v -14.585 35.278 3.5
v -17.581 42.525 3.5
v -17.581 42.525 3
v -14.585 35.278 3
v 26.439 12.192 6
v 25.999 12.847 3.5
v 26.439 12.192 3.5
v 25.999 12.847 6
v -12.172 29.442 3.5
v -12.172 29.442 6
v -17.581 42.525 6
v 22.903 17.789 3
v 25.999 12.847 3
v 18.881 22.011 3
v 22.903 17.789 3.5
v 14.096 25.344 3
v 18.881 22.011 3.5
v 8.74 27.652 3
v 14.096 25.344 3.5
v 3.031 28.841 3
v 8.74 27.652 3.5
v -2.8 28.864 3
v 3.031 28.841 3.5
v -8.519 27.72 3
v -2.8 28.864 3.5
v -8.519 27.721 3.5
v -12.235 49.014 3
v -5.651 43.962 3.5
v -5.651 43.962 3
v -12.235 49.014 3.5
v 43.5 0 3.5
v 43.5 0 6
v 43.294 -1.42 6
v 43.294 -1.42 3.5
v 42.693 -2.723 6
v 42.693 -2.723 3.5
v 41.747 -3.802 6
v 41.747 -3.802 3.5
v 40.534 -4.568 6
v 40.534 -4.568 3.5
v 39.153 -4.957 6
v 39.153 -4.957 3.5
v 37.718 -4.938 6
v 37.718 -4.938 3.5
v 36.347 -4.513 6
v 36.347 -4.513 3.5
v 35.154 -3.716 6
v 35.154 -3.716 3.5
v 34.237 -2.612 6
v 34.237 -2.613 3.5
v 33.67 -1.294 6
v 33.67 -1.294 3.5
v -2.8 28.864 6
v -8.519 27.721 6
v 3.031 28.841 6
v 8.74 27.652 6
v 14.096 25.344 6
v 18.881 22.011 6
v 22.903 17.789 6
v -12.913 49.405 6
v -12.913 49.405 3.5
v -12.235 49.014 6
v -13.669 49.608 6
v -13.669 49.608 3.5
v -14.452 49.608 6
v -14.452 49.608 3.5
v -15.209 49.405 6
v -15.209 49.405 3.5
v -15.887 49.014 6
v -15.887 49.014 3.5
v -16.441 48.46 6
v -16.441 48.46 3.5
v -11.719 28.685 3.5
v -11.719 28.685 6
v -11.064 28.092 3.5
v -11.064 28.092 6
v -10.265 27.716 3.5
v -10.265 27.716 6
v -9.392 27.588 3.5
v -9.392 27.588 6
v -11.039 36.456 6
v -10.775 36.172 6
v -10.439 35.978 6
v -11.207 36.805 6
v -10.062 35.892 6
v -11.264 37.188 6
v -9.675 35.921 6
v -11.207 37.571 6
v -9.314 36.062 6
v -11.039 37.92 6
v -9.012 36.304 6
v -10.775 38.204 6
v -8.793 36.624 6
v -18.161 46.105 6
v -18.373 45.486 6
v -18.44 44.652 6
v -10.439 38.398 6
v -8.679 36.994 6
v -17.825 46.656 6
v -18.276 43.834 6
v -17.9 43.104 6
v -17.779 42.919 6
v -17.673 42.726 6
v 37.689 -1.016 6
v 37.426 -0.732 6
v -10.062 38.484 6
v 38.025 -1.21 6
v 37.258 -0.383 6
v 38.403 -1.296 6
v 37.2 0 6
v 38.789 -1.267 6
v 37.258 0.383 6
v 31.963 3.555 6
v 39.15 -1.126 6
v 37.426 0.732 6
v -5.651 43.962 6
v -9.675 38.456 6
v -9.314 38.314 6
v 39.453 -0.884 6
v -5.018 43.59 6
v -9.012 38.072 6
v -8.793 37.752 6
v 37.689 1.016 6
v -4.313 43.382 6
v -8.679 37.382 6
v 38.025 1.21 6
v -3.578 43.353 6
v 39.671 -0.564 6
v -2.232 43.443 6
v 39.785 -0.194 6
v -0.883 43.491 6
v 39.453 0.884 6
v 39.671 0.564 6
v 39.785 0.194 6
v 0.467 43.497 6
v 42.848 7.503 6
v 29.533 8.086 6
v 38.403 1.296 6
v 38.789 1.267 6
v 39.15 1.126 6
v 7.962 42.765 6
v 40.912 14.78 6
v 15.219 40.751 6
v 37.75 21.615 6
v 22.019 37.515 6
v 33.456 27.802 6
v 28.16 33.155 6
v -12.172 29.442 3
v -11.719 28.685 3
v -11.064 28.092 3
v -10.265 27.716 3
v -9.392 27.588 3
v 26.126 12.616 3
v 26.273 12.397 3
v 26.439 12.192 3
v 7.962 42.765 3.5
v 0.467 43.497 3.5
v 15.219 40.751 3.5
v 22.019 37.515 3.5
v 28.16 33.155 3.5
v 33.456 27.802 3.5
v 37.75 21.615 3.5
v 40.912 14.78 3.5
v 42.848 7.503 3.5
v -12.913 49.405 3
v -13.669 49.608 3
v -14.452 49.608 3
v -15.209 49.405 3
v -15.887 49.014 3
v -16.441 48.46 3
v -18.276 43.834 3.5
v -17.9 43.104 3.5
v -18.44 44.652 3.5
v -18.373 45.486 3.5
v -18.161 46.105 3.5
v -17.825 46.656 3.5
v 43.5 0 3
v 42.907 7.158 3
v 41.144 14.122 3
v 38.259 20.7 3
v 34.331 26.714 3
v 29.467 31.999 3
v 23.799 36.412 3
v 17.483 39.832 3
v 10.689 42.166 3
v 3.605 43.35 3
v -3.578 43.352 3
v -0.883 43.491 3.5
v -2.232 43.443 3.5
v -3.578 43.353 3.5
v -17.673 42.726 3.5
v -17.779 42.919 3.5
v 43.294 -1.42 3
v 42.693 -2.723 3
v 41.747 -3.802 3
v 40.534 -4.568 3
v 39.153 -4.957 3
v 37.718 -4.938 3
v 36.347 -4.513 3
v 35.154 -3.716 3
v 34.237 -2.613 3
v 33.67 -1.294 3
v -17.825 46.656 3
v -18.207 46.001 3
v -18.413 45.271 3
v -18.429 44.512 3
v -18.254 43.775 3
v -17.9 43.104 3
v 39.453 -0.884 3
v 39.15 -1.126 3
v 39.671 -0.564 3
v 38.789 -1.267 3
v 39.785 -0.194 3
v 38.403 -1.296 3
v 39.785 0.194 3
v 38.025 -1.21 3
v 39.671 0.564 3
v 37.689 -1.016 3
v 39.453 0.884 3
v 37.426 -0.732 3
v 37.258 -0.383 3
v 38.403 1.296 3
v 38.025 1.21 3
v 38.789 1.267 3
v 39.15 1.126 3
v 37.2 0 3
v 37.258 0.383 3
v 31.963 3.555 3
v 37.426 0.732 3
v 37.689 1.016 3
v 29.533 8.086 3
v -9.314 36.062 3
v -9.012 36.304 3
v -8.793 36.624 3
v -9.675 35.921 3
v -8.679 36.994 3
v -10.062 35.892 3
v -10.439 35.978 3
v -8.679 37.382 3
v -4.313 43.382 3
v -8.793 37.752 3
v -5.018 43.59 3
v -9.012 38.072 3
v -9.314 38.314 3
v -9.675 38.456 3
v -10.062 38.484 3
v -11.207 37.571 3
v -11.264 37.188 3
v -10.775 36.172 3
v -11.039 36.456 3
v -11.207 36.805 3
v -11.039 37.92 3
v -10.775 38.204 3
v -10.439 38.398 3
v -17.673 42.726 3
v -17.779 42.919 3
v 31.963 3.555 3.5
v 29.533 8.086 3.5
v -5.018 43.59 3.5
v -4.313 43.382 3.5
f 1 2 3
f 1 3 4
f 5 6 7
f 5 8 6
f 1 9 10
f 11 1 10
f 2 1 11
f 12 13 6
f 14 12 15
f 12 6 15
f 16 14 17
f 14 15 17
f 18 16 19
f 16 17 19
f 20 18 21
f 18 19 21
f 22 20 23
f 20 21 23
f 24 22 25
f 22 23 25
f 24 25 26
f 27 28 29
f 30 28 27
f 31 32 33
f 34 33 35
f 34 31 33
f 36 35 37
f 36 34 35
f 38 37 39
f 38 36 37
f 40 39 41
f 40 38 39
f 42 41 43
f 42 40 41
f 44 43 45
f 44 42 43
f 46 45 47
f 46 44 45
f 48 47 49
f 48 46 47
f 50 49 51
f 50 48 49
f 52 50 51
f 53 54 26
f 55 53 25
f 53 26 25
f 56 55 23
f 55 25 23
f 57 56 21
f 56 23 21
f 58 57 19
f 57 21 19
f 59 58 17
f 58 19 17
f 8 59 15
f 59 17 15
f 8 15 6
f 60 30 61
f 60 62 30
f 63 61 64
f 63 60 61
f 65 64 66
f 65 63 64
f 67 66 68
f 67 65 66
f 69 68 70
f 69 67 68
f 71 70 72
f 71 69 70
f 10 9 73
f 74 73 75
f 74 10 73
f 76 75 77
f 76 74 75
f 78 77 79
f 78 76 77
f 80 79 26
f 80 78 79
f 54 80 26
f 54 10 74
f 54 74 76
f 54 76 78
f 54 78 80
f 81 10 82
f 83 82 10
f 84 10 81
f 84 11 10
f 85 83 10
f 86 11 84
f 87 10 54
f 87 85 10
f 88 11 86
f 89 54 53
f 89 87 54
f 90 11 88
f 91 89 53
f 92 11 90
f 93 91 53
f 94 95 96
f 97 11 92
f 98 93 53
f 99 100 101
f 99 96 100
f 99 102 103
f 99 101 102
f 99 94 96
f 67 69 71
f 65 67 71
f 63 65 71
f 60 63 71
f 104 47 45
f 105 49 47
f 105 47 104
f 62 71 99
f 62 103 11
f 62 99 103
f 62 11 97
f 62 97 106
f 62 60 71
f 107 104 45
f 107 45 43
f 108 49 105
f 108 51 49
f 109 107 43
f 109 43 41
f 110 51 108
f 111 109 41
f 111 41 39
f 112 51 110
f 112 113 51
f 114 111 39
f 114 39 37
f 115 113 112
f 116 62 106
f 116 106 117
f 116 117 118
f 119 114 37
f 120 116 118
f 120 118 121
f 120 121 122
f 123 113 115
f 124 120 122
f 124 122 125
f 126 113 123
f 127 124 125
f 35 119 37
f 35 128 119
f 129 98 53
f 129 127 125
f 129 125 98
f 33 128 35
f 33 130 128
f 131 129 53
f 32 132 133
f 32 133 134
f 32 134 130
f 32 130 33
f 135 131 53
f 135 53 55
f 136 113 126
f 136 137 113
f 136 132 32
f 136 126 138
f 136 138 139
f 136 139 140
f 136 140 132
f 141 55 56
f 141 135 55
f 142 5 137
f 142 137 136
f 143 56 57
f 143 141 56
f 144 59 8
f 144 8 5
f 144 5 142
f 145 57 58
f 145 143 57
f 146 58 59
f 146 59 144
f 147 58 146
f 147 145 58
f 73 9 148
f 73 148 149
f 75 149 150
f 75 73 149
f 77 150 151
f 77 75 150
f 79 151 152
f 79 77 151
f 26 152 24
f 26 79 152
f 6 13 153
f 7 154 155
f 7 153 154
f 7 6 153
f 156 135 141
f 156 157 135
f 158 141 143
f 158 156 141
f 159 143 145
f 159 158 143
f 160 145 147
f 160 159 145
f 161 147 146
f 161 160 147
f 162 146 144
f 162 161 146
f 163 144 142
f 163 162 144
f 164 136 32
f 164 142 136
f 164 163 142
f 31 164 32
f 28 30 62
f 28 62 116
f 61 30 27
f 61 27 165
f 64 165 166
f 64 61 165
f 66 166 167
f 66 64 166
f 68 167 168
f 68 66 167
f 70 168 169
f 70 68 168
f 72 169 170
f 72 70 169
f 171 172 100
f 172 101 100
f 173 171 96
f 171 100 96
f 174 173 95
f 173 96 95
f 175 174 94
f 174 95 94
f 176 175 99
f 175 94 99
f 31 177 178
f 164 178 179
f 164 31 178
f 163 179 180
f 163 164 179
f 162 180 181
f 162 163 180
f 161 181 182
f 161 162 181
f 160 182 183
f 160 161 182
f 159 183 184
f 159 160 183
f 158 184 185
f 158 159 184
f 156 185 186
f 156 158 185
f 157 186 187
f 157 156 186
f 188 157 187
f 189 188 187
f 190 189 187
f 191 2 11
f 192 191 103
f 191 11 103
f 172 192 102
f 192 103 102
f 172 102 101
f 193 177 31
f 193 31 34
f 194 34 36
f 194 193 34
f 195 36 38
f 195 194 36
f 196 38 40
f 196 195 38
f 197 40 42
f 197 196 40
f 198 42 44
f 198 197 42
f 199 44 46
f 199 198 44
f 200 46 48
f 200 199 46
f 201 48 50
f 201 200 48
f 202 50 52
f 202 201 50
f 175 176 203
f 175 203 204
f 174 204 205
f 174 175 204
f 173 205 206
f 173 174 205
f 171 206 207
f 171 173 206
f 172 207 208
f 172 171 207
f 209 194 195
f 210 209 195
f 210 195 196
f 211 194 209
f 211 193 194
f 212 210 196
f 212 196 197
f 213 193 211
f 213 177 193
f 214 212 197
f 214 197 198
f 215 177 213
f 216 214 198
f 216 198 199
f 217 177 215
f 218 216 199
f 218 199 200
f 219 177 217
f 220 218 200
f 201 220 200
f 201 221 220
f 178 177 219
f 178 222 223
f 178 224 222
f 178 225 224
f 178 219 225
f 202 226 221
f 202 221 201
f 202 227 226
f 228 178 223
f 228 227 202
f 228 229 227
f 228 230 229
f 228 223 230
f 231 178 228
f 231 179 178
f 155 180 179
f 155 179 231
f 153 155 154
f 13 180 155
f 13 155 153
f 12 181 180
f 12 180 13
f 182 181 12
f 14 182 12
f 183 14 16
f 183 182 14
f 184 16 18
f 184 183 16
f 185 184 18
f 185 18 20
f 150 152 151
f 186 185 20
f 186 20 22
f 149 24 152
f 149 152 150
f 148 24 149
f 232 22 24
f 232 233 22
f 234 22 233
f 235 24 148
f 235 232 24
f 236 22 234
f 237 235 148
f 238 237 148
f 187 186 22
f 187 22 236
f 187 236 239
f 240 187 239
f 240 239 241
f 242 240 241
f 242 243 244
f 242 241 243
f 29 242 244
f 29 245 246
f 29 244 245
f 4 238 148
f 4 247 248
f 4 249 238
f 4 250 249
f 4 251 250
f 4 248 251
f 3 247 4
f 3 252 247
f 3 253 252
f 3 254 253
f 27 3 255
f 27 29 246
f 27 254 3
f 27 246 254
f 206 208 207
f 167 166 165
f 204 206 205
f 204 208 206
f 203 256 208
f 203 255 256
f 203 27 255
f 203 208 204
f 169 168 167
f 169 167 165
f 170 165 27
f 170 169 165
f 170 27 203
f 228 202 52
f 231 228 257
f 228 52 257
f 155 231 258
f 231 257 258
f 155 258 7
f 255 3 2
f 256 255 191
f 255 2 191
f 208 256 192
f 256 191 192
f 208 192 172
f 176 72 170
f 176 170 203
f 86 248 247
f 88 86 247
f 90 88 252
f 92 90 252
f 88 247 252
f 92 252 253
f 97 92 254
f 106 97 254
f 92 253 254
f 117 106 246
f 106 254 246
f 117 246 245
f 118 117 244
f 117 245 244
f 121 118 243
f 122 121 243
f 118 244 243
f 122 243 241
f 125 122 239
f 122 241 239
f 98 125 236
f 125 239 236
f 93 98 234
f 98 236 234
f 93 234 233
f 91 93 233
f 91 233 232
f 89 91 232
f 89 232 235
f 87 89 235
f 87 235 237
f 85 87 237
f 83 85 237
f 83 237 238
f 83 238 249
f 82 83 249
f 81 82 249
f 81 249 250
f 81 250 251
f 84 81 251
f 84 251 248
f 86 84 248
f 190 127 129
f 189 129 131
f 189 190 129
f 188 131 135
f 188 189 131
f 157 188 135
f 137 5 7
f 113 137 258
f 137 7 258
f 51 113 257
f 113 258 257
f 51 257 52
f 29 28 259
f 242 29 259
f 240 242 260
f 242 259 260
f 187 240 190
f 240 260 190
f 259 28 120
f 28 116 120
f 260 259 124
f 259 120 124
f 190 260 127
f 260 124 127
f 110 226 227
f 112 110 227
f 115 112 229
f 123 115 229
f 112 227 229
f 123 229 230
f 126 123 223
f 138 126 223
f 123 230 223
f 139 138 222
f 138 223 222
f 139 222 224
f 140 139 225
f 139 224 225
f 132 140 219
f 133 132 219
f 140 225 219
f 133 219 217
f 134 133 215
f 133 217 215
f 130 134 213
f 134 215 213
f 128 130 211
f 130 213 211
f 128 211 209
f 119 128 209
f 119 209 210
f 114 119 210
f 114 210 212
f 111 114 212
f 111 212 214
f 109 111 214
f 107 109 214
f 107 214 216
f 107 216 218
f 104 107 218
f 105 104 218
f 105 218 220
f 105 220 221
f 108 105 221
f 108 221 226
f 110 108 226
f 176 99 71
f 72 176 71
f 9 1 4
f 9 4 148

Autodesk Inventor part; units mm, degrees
ref_plane "YZ Plane" through (0, 0, 0) normal (1, 0, 0) x (0, 1, 0)
ref_plane "XZ Plane" through (0, 0, 0) normal (0, 1, 0) x (-1, 0, 0)
ref_plane "XY Plane" through (0, 0, 0) normal (0, 0, 1) x (1, 0, 0)
sketch "スケッチ1" plane through (0, 0, 0) normal (0, 0, 1) x (1, 0, 0)
  circle A0 centre (0, 0) radius 33.5 construction
  circle A1 centre (0, 0) radius 43.5
  dimension "d0" = 67
  dimension "d1" = 87
extrude "押し出し1" add sketch "スケッチ1" along normal blind 1
sketch "スケッチ2" plane through (0, 0, 1) normal (0, 0, 1) x (1, 0, 0)
  circle A0 centre (0, 0) radius 33.5
  circle A1 centre (0, 0) radius 43.5 projected
  dimension "d4" = 67
extrude "押し出し2" add sketch "スケッチ2" along normal blind 2
sketch "スケッチ4" plane through (0, 0, 3) normal (0, 0, 1) x (1, 0, 0)
  circle A0 centre (0, 0) radius 33.5 construction
  circle A1 centre (0, 0) radius 43.5 construction
  line L0 (0, 0) -> (33.5, 0) construction
  line L1 (33.5, 0) -> (43.5, 0) construction
  circle A2 centre (0, 0) radius 33.5 construction
  line L2 (0, 0) -> (-33.5, 0) construction
  circle A3 centre (0, 0) radius 43.5 construction
  line L3 (-43.5, 0) -> (-33.5, 0) construction
  circle A4 centre (38.5, 0) radius 3.05
  circle A5 centre (-38.5, 0) radius 3.05
  circle A6 centre (0, 0) radius 38.5 construction
  circle A7 centre (-9.9645, 37.1881) radius 3.05 construction
  arc A8 (-3.4944, 44.3648) -> (-9.9645, 37.1881) centre (38.5, 0) ccw construction
  line L4 (38.5, 0) -> (-9.9645, 37.1881) construction
  line L5 (-9.9645, 37.1881) -> (-12.3843, 39.0449) construction
  arc A9 (0.0788, 43.4999) -> (-7.5448, 35.3314) centre (38.5, 0) ccw
  arc A10 (-9.6001, 42.4274) -> (-12.3843, 39.0449) centre (38.5, 0) ccw
  arc A11 (-12.3843, 39.0449) -> (-7.5448, 35.3314) centre (-9.9645, 37.1881) ccw
  arc A12 (0.0788, 43.4999) -> (-9.6001, 42.4274) centre (0, 0) ccw
  circle A13 centre (9.9645, -37.1881) radius 3.05 construction
  line L6 (-38.5, 0) -> (9.9645, -37.1881) construction
  line L7 (9.9645, -37.1881) -> (12.3843, -39.0449) construction
  arc A14 (-0.0788, -43.4999) -> (7.5448, -35.3314) centre (-38.5, 0) ccw
  arc A15 (9.6001, -42.4274) -> (12.3843, -39.0449) centre (-38.5, 0) ccw
  arc A16 (12.3843, -39.0449) -> (7.5448, -35.3314) centre (9.9645, -37.1881) ccw
  arc A17 (-0.0788, -43.4999) -> (9.6001, -42.4274) centre (0, 0) ccw
  line L8 (-9.9645, 37.1881) -> (9.9645, -37.1881) construction
  dimension "d7" = 6.1
  dimension "d8" = 3.05
  dimension "d15" = 105
extrude "押し出し3" cut sketch "スケッチ4" against normal through all
fillet "フィレット1" radius 1 4 edges at (-9.6001, 42.4274, 1.5) (0.0788, 43.4999, 1.5) (-0.0788, -43.4999, 1.5) (9.6001, -42.4274, 1.5)
sketch "スケッチ6" plane through (0, 0, 3) normal (0, 0, 1) x (1, 0, 0)
  arc A0 (-12.3843, 39.0449) -> (-7.5448, 35.3314) centre (-9.9645, 37.1881) ccw construction
  circle A1 centre (38.5, 0) radius 3.05 construction
  circle A2 centre (-9.9645, 37.1881) radius 3
  circle A3 centre (38.5, 0) radius 3
  point P0 (0, 0)
  dimension "d16" = 6
extrude "押し出し5" add sketch "スケッチ6" along normal blind 0.1
sketch "スケッチ7" plane through (-9.9645, 37.1881, 3.1) normal (0, 0, 1) x (1, 0, 0)
  circle A0 centre (0, 0) radius 3 construction
  circle A1 centre (48.4645, -37.1881) radius 3 construction
  circle A2 centre (0, 0) radius 5
  circle A3 centre (48.4645, -37.1881) radius 3 projected
  circle A4 centre (48.4645, -37.1881) radius 5
  point P0 (9.9645, -37.1881)
  dimension "d19" = 10
extrude "押し出し6" add sketch "スケッチ7" along normal blind 0.4 contours A2 | A3 | A4
sketch "スケッチ8" plane through (-9.9645, 37.1881, 3.5) normal (0, 0, 1) x (1, 0, 0)
  circle A0 centre (9.9645, -37.1881) radius 33.5 construction
  circle A1 centre (9.9645, -37.1881) radius 29 construction
  circle A2 centre (48.4645, -37.1881) radius 5 construction
  arc A3 (43.6349, -38.4822) -> (36.1372, -24.6985) centre (11.2764, -47.1527) ccw construction
  line L0 (9.9645, -37.1881) -> (48.4645, -37.1881) construction
  line L1 (48.4645, -37.1881) -> (11.2764, -47.1527) construction
  circle A4 centre (0, 0) radius 5 construction
  circle A5 centre (48.4645, -37.1881) radius 3.05 construction
  line L2 (48.4645, -37.1881) -> (-9.5202, 7.3051) construction
  line L3 (9.9645, -37.1881) -> (-4.6207, -1.9104) construction
  circle A6 centre (0, 0) radius 5 construction
  line L4 (-1.1156, -10.3883) -> (-7.9245, 6.0806)
  arc A7 (36.1372, -24.6985) -> (-1.1156, -10.3883) centre (9.9645, -37.1881) ccw
  arc A8 (43.6349, -38.4822) -> (36.1372, -24.6985) centre (11.2764, -47.1527) ccw
  arc A9 (22.6521, -78.7967) -> (10.4317, 6.3093) centre (9.9645, -37.1881) ccw projected
  arc A10 (43.6349, -38.4822) -> (53.4645, -37.1881) centre (48.4645, -37.1881) ccw
  arc A11 (53.4645, -37.1881) -> (5.2496, 6.0556) centre (9.9645, -37.1881) ccw
  line L5 (-7.9245, 6.0806) -> (-9.5202, 7.3051)
  line L6 (-9.5202, 7.3051) -> (-4.6501, 13.652)
  line L7 (-4.6501, 13.652) -> (5.2496, 6.0556)
  point P0 (10.4317, 6.3093)
  dimension "d22" = 58
  dimension "d23" = 15
  dimension "d24" = 12
  dimension "d25" = 8
extrude "押し出し7" add sketch "スケッチ8" along normal blind 2.5
sketch "スケッチ9" plane through (0, 0, 3) normal (0, 0, 1) x (1, 0, 0)
  circle A0 centre (0, 0) radius 61.8319
extrude "押し出し8" cut sketch "スケッチ9" against normal through all
sketch "スケッチ10" plane through (-9.9645, 37.1881, 3) normal (0, 0, -1) x (-1, 0, 0)
  circle A0 centre (-48.4645, -37.1881) radius 3 construction
  circle A1 centre (0, 0) radius 3 construction
  circle A2 centre (-48.4645, -37.1881) radius 1.3
  circle A3 centre (0, 0) radius 1.3
  point P0 (-9.9645, -37.1881)
  dimension "d30" = 2.6
extrude "押し出し9" cut sketch "スケッチ10" against normal through all
fillet "フィレット2" radius 3 6 edges at (-19.4848, 44.4933, 4.75) (-14.6147, 50.8401, 4.75) (-17.889, 43.2688, 4.75) (-4.7149, 43.2437, 4.75) (-11.0801, 26.7998, 4.75) (26.1727, 12.4896, 4.75)
sketch "スケッチ11" plane through (38.5, 0, 3) normal (0, 0, -1) x (-1, 0, 0)
  circle A0 centre (0, 0) radius 3 projected
  circle A1 centre (0, 0) radius 5 projected
  circle A2 centre (48.4645, 37.1881) radius 3 projected
  circle A3 centre (48.4645, 37.1881) radius 5 projected
  point P0 (38.5, 0)
extrude "押し出し10" add sketch "スケッチ11" against normal up to surface (0.1 mm away)
sketch "スケッチ12" plane through (-9.9645, 37.1881, 3.5) normal (0, 0, -1) x (-1, 0, 0)
  arc A0 (7.9351, 5.9159) -> (7.8609, 9.4676) centre (5.4809, 7.6413) ccw projected
  line L0 (6.4764, 11.2719) -> (7.8609, 9.4676) projected
  arc A1 (6.4764, 11.2719) -> (2.2701, 11.8257) centre (4.0964, 9.4456) ccw projected
  line L1 (-4.3131, 6.7742) -> (2.2701, 11.8257) projected
  arc A2 (-6.3862, 6.1644) -> (-4.3131, 6.7742) centre (-6.1394, 9.1543) ccw projected
  arc A3 (-6.3862, 6.1644) -> (-53.4645, -37.1881) centre (-9.9645, -37.1881) ccw projected
  arc A4 (-43.6349, -38.4822) -> (-53.4645, -37.1881) centre (-48.4645, -37.1881) ccw projected
  arc A5 (-36.4032, -24.9966) -> (-43.6349, -38.4822) centre (-11.2764, -47.1527) ccw projected
  arc A6 (-36.4032, -24.9966) -> (-35.9638, -24.3414) centre (-38.6534, -23.0124) ccw projected
  arc A7 (-1.4457, -9.4676) -> (-35.9638, -24.3414) centre (-9.9645, -37.1881) ccw projected
  arc A8 (-1.4457, -9.4676) -> (2.2079, -7.7461) centre (-0.5645, -6.5999) ccw projected
  line L2 (4.6207, -1.9104) -> (2.2079, -7.7461) projected
  circle A9 centre (0, 0) radius 5 projected
  line L3 (7.6169, 5.3368) -> (4.6207, -1.9104) projected
  arc A10 (7.9351, 5.9159) -> (7.6169, 5.3368) centre (10.3893, 4.1906) ccw projected
extrude "押し出し11" add sketch "スケッチ12" along normal up to surface (0.5 mm away)
ref_plane "作業平面1" through (-8.5188, 27.7206, 3.5) normal (-0.5666562, -0.8239543, 0) x (0, 0, -1)
properties part number "canere_02_t3_01"
